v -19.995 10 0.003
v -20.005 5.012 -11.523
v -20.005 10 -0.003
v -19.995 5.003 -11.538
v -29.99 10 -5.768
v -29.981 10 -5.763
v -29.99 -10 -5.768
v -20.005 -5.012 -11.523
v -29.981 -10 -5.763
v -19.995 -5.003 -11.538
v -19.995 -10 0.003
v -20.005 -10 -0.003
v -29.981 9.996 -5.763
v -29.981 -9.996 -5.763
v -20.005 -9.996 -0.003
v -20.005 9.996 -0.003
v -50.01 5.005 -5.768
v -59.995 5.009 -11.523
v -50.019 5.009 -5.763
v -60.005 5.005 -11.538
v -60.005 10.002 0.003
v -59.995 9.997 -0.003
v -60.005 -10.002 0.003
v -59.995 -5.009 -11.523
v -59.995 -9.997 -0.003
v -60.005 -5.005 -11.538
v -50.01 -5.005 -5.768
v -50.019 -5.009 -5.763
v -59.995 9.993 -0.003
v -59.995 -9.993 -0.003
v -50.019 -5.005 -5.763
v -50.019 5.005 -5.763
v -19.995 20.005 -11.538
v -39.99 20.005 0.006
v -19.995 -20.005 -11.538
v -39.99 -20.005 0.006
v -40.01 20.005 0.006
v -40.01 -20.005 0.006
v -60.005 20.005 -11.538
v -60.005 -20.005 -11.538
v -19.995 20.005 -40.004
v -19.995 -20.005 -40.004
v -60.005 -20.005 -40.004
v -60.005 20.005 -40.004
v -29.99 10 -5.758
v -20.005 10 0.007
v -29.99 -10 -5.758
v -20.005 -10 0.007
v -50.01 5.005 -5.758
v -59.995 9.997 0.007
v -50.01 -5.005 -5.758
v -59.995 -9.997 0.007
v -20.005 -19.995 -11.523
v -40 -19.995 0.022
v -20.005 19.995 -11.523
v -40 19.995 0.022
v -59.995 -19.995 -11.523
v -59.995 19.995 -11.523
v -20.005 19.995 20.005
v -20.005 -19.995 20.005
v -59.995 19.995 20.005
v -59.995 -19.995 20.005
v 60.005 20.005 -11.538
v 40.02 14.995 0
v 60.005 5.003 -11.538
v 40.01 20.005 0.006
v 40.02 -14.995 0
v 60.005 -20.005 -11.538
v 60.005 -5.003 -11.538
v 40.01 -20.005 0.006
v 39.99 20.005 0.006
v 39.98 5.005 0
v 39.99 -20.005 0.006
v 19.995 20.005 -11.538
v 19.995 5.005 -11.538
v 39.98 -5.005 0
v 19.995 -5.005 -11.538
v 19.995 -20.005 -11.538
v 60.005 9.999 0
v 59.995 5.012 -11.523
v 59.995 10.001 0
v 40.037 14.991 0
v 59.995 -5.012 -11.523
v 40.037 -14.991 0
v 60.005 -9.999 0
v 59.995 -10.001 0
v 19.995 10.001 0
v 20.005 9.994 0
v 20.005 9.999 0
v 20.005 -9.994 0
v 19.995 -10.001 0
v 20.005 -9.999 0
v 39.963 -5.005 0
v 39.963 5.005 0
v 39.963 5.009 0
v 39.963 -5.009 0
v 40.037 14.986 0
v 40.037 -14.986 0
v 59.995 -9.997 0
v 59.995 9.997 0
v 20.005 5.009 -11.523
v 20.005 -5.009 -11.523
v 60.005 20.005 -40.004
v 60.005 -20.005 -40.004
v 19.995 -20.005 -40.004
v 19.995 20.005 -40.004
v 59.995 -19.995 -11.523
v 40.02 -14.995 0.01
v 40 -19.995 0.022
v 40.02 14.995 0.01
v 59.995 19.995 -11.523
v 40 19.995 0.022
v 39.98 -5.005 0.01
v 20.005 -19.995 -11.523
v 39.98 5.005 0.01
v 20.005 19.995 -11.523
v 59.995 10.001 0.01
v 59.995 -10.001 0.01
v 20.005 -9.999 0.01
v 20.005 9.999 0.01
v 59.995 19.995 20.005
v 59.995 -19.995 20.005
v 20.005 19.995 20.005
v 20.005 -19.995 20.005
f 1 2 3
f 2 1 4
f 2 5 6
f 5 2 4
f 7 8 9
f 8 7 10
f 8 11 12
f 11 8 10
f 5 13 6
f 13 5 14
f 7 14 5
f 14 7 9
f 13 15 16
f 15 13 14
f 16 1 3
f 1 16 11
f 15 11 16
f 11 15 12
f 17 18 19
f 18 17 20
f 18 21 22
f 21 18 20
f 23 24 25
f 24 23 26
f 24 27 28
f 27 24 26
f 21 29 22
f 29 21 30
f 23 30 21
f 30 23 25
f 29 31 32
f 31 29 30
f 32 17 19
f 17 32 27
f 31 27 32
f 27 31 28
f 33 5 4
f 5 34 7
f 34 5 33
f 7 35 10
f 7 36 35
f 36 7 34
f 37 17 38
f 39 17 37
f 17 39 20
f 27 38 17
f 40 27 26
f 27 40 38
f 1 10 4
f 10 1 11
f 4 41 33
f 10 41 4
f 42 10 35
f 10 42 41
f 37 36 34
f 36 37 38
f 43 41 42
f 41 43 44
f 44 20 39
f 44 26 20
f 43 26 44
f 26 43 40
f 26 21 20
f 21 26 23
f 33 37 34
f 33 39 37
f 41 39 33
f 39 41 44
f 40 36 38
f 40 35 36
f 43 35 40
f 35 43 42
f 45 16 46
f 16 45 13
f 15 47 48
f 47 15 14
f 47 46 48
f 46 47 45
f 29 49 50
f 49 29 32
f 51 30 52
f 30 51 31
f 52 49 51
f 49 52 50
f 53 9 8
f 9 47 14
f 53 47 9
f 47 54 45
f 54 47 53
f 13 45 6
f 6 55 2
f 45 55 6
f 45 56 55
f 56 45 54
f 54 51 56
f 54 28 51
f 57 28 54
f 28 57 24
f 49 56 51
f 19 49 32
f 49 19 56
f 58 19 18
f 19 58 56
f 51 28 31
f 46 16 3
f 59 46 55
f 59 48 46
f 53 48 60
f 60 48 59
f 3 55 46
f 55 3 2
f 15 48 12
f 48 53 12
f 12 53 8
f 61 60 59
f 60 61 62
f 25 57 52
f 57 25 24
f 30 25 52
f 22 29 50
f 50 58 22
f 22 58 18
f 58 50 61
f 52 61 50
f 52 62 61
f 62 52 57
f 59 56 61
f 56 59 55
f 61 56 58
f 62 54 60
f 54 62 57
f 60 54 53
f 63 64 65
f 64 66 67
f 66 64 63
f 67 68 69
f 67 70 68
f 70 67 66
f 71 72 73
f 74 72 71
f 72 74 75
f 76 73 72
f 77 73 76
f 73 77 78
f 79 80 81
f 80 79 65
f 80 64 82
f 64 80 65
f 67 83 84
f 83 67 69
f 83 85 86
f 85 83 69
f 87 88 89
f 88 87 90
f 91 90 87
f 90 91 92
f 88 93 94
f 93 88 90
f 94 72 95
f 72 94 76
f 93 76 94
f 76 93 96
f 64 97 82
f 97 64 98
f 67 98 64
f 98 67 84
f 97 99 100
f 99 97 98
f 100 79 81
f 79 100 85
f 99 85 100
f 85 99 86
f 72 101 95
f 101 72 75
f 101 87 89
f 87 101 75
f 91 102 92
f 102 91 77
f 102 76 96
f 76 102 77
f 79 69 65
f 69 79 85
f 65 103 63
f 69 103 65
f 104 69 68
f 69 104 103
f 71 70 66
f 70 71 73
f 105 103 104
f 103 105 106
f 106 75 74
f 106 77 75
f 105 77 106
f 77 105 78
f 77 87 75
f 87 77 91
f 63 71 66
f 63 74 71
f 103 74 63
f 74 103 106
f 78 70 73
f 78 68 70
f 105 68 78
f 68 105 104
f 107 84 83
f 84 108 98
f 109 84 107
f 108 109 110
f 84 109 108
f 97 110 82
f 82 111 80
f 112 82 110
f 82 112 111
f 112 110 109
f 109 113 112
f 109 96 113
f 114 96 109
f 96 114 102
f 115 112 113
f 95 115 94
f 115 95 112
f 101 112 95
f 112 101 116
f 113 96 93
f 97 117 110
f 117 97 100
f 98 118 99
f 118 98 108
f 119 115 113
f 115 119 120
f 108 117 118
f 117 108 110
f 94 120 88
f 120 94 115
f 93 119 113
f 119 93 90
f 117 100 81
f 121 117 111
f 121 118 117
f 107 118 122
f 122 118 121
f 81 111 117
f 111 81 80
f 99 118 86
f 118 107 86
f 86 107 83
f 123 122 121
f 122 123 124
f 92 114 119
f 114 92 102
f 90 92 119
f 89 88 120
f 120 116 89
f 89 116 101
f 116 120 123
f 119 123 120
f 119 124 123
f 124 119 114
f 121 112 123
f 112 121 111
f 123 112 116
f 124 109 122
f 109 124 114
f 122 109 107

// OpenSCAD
module dovetail(a=10,b=4,h=10,l=25)
    linear_extrude(l)polygon([[-h,-a+b/2],[-h,a-b/2],[h,b/2],[h,-b/2]]);
module dovetail_template(ang=-30)
    union()
      {
     for (x=[1,-1])
      translate([x*20,0,0])difference()
          {rotate([0,60,0])translate([0,0,-20])dovetail(20,10,10,40);
           rotate([0,x*ang,0])translate([0,0,30])cube(60,center=true);}   
      difference()
        {
        translate([0,0,-20])cube(45 ,center=true);
        for (a=[30,-30]) rotate([0,a,0])translate([0,0,30.01])cube(60,center=true);
        };
      };
//$t=0.5;
for (o_a=[[-40,-30],[40,0]])let(o=o_a[0],a=o_a[1])translate([o,0,0])rotate($t*720){
intersection() 
    {
    translate([0,0,-19.999])cube(40.01,center=true); 
    dovetail_template(ang=a);
        };      
color("blue",1)translate([sin($t*180)^2*25,0,sin($t*180)^2*25*tan(30)+0.01])difference(){
    cube(39.99,center=true);
    dovetail_template(ang=a);
    };}
